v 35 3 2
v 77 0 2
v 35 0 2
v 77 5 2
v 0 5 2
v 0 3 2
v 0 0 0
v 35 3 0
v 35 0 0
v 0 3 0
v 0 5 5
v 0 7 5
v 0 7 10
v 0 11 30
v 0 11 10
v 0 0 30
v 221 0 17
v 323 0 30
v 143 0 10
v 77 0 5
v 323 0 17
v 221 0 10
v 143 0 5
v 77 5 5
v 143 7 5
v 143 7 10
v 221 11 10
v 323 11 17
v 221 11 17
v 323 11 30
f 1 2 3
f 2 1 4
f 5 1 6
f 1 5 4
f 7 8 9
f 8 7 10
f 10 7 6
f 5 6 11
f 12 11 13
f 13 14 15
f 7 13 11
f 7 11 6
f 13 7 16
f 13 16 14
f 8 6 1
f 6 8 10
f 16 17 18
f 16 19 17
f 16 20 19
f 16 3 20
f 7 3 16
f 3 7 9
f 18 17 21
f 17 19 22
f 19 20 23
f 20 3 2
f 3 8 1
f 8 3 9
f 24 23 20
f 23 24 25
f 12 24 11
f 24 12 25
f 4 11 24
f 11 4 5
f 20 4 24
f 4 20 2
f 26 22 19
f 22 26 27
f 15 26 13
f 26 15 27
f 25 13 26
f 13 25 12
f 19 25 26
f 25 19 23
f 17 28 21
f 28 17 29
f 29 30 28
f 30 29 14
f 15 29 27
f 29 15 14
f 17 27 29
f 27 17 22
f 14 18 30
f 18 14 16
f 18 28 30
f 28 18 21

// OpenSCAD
translate([2.5, 1.5, 1.0]) color([0.48328798826810027, 0.20363990437036994, 0.0018431606156659175]) cube([5, 3, 2], center=true);
translate([7.5, 1.5, 1.0]) color([0.698991711803439, 0.6187355180234525, 0.007776649435864202]) cube([5, 3, 2], center=true);
translate([12.5, 1.5, 1.0]) color([0.2985601210181208, 0.7686342595428415, 0.6289203785446209]) cube([5, 3, 2], center=true);
translate([17.5, 1.5, 1.0]) color([0.5452081159439722, 0.1562211098090489, 0.7062940429996885]) cube([5, 3, 2], center=true);
translate([22.5, 1.5, 1.0]) color([0.4714349217158037, 0.6781787462359636, 0.7600898367234922]) cube([5, 3, 2], center=true);
translate([27.5, 1.5, 1.0]) color([0.23236272144124515, 0.7619950130977117, 0.28008838468838926]) cube([5, 3, 2], center=true);
translate([32.5, 1.5, 1.0]) color([0.9840151371182455, 0.12083161078451865, 0.8837180187440564]) cube([5, 3, 2], center=true);
translate([3.5, 2.5, 3.5]) color([0.040547125043371324, 0.256575818348144, 0.5261019087624684]) cube([7, 5, 3], center=true);
translate([10.5, 2.5, 3.5]) color([0.5816161834445946, 0.3962349850280922, 0.10203172822707107]) cube([7, 5, 3], center=true);
translate([17.5, 2.5, 3.5]) color([0.2526080858247133, 0.28339650386048865, 0.7552228545587315]) cube([7, 5, 3], center=true);
translate([24.5, 2.5, 3.5]) color([0.9087743252220071, 0.5954099154864194, 0.03545096569102746]) cube([7, 5, 3], center=true);
translate([31.5, 2.5, 3.5]) color([0.7922364716417103, 0.30560393283991993, 0.33989040641624346]) cube([7, 5, 3], center=true);
translate([38.5, 2.5, 3.5]) color([0.5301854376454147, 0.24904704757555507, 0.9199780878573697]) cube([7, 5, 3], center=true);
translate([45.5, 2.5, 3.5]) color([0.1635547583408129, 0.41483040050373277, 0.2896919495072058]) cube([7, 5, 3], center=true);
translate([52.5, 2.5, 3.5]) color([0.5198341022016146, 0.5739818030823766, 0.6271396891048426]) cube([7, 5, 3], center=true);
translate([59.5, 2.5, 3.5]) color([0.5313758038379728, 0.4108045023355995, 0.634594012376466]) cube([7, 5, 3], center=true);
translate([66.5, 2.5, 3.5]) color([0.40341287658681757, 0.7785502590540477, 0.7881774252549901]) cube([7, 5, 3], center=true);
translate([73.5, 2.5, 3.5]) color([0.29225416811082217, 0.37180432355577453, 0.6288109059468862]) cube([7, 5, 3], center=true);
translate([5.5, 3.5, 7.5]) color([0.15706996711565713, 0.6970319309869248, 0.3814277529807131]) cube([11, 7, 5], center=true);
translate([16.5, 3.5, 7.5]) color([0.591062474757007, 0.1395330992312218, 0.6682583860975598]) cube([11, 7, 5], center=true);
translate([27.5, 3.5, 7.5]) color([0.3540578606136997, 0.4726655762072315, 0.4151074008495357]) cube([11, 7, 5], center=true);
translate([38.5, 3.5, 7.5]) color([0.47671524799509457, 0.6946956329164442, 0.31824017683207795]) cube([11, 7, 5], center=true);
translate([49.5, 3.5, 7.5]) color([0.6520544808985483, 0.060222107499701916, 0.3001851524622099]) cube([11, 7, 5], center=true);
translate([60.5, 3.5, 7.5]) color([0.7452096901500458, 0.05240587806206365, 0.6211421952822352]) cube([11, 7, 5], center=true);
translate([71.5, 3.5, 7.5]) color([0.025546799267838538, 0.4715288683099005, 0.8885450437134765]) cube([11, 7, 5], center=true);
translate([82.5, 3.5, 7.5]) color([0.010110093997603875, 0.5268280206539229, 0.06645682965886301]) cube([11, 7, 5], center=true);
translate([93.5, 3.5, 7.5]) color([0.8671097761494883, 0.6862965222396646, 0.7419538566814291]) cube([11, 7, 5], center=true);
translate([104.5, 3.5, 7.5]) color([0.669007579945888, 0.006423453698145676, 0.041177862257898545]) cube([11, 7, 5], center=true);
translate([115.5, 3.5, 7.5]) color([0.6208768040220466, 0.9996851255769114, 0.8731472390917929]) cube([11, 7, 5], center=true);
translate([126.5, 3.5, 7.5]) color([0.699685806725371, 0.7270999543422898, 0.2266870226016624]) cube([11, 7, 5], center=true);
translate([137.5, 3.5, 7.5]) color([0.751613934135812, 0.28792410486343756, 0.10546026702239297]) cube([11, 7, 5], center=true);
translate([6.5, 5.5, 13.5]) color([0.4608948954667579, 0.33019577252961807, 0.168255398651179]) cube([13, 11, 7], center=true);
translate([19.5, 5.5, 13.5]) color([0.42170989251140467, 0.8972009769638755, 0.4352702732981688]) cube([13, 11, 7], center=true);
translate([32.5, 5.5, 13.5]) color([0.4472918952497248, 0.708827757444238, 0.5241618701522923]) cube([13, 11, 7], center=true);
translate([45.5, 5.5, 13.5]) color([0.12922303534199353, 0.91039239754397, 0.4441243361619651]) cube([13, 11, 7], center=true);
translate([58.5, 5.5, 13.5]) color([0.7893377392253591, 0.38887513002224416, 0.806846018820692]) cube([13, 11, 7], center=true);
translate([71.5, 5.5, 13.5]) color([0.3895364160074527, 0.2201595216660458, 0.19619466691666865]) cube([13, 11, 7], center=true);
translate([84.5, 5.5, 13.5]) color([0.9400346443375104, 0.58653025858102, 0.04979326505826487]) cube([13, 11, 7], center=true);
translate([97.5, 5.5, 13.5]) color([0.38834759617804915, 0.234029260524927, 0.08465706460929934]) cube([13, 11, 7], center=true);
translate([110.5, 5.5, 13.5]) color([0.18675586852140846, 0.05699047999950346, 0.6380736282281027]) cube([13, 11, 7], center=true);
translate([123.5, 5.5, 13.5]) color([0.17337386483746886, 0.6107798762435255, 0.6125067478912297]) cube([13, 11, 7], center=true);
translate([136.5, 5.5, 13.5]) color([0.7049237107399368, 0.5121186506114312, 0.28442399033479826]) cube([13, 11, 7], center=true);
translate([149.5, 5.5, 13.5]) color([0.8774574539285279, 0.35307108172351365, 0.4582943249787391]) cube([13, 11, 7], center=true);
translate([162.5, 5.5, 13.5]) color([0.6318794317305464, 0.5161242981674495, 0.9564683485665337]) cube([13, 11, 7], center=true);
translate([175.5, 5.5, 13.5]) color([0.9547176774381221, 0.9297598506094263, 0.9340763496652581]) cube([13, 11, 7], center=true);
translate([188.5, 5.5, 13.5]) color([0.580960135568696, 0.49020206373000297, 0.7041168173823689]) cube([13, 11, 7], center=true);
translate([201.5, 5.5, 13.5]) color([0.21541959298546798, 0.26587203921552827, 0.04380725363309168]) cube([13, 11, 7], center=true);
translate([214.5, 5.5, 13.5]) color([0.16285754255803098, 0.0038745499388105342, 0.6546275765234981]) cube([13, 11, 7], center=true);
translate([8.5, 5.5, 23.5]) color([0.14040698903568194, 0.7866793455760521, 0.680503995881725]) cube([17, 11, 13], center=true);
translate([25.5, 5.5, 23.5]) color([0.9706757933544957, 0.3965144869518913, 0.9213919134510528]) cube([17, 11, 13], center=true);
translate([42.5, 5.5, 23.5]) color([0.4537041723195332, 0.3395037398362071, 0.10233886991705377]) cube([17, 11, 13], center=true);
translate([59.5, 5.5, 23.5]) color([0.8828321850718597, 0.7947901585625868, 0.3229289765350606]) cube([17, 11, 13], center=true);
translate([76.5, 5.5, 23.5]) color([0.45574438492562896, 0.32514346581324827, 0.028829116538094723]) cube([17, 11, 13], center=true);
translate([93.5, 5.5, 23.5]) color([0.04435252539911694, 0.3687041258820589, 0.20959132812878367]) cube([17, 11, 13], center=true);
translate([110.5, 5.5, 23.5]) color([0.5245146032105923, 0.1877850356496189, 0.2016215864664097]) cube([17, 11, 13], center=true);
translate([127.5, 5.5, 23.5]) color([0.6726678813176303, 0.7356026567617159, 0.31223209587410494]) cube([17, 11, 13], center=true);
translate([144.5, 5.5, 23.5]) color([0.8599943994333726, 0.2546391746557106, 0.34394037628155716]) cube([17, 11, 13], center=true);
translate([161.5, 5.5, 23.5]) color([0.712480390369609, 0.04450290132920964, 0.934183460116191]) cube([17, 11, 13], center=true);
translate([178.5, 5.5, 23.5]) color([0.07233773178762537, 0.4609310589380602, 0.7246048259600892]) cube([17, 11, 13], center=true);
translate([195.5, 5.5, 23.5]) color([0.04746853498479808, 0.8090026856371774, 0.9788933433114139]) cube([17, 11, 13], center=true);
translate([212.5, 5.5, 23.5]) color([0.460511672795628, 0.11812363628756806, 0.08147699565547994]) cube([17, 11, 13], center=true);
translate([229.5, 5.5, 23.5]) color([0.09873043616313526, 0.7654413741364753, 0.4140128484685186]) cube([17, 11, 13], center=true);
translate([246.5, 5.5, 23.5]) color([0.9192341581990311, 0.4406397760864845, 0.07714331014460807]) cube([17, 11, 13], center=true);
translate([263.5, 5.5, 23.5]) color([0.42693558751800065, 0.7548278934255565, 0.8293384268467949]) cube([17, 11, 13], center=true);
translate([280.5, 5.5, 23.5]) color([0.039351686529191854, 0.1803893912563338, 0.490013452023644]) cube([17, 11, 13], center=true);
translate([297.5, 5.5, 23.5]) color([0.12808547795160863, 0.8710926419421733, 0.9344608884461488]) cube([17, 11, 13], center=true);
translate([314.5, 5.5, 23.5]) color([0.3195969983538176, 0.43484368255202, 0.5570540644200566]) cube([17, 11, 13], center=true);
